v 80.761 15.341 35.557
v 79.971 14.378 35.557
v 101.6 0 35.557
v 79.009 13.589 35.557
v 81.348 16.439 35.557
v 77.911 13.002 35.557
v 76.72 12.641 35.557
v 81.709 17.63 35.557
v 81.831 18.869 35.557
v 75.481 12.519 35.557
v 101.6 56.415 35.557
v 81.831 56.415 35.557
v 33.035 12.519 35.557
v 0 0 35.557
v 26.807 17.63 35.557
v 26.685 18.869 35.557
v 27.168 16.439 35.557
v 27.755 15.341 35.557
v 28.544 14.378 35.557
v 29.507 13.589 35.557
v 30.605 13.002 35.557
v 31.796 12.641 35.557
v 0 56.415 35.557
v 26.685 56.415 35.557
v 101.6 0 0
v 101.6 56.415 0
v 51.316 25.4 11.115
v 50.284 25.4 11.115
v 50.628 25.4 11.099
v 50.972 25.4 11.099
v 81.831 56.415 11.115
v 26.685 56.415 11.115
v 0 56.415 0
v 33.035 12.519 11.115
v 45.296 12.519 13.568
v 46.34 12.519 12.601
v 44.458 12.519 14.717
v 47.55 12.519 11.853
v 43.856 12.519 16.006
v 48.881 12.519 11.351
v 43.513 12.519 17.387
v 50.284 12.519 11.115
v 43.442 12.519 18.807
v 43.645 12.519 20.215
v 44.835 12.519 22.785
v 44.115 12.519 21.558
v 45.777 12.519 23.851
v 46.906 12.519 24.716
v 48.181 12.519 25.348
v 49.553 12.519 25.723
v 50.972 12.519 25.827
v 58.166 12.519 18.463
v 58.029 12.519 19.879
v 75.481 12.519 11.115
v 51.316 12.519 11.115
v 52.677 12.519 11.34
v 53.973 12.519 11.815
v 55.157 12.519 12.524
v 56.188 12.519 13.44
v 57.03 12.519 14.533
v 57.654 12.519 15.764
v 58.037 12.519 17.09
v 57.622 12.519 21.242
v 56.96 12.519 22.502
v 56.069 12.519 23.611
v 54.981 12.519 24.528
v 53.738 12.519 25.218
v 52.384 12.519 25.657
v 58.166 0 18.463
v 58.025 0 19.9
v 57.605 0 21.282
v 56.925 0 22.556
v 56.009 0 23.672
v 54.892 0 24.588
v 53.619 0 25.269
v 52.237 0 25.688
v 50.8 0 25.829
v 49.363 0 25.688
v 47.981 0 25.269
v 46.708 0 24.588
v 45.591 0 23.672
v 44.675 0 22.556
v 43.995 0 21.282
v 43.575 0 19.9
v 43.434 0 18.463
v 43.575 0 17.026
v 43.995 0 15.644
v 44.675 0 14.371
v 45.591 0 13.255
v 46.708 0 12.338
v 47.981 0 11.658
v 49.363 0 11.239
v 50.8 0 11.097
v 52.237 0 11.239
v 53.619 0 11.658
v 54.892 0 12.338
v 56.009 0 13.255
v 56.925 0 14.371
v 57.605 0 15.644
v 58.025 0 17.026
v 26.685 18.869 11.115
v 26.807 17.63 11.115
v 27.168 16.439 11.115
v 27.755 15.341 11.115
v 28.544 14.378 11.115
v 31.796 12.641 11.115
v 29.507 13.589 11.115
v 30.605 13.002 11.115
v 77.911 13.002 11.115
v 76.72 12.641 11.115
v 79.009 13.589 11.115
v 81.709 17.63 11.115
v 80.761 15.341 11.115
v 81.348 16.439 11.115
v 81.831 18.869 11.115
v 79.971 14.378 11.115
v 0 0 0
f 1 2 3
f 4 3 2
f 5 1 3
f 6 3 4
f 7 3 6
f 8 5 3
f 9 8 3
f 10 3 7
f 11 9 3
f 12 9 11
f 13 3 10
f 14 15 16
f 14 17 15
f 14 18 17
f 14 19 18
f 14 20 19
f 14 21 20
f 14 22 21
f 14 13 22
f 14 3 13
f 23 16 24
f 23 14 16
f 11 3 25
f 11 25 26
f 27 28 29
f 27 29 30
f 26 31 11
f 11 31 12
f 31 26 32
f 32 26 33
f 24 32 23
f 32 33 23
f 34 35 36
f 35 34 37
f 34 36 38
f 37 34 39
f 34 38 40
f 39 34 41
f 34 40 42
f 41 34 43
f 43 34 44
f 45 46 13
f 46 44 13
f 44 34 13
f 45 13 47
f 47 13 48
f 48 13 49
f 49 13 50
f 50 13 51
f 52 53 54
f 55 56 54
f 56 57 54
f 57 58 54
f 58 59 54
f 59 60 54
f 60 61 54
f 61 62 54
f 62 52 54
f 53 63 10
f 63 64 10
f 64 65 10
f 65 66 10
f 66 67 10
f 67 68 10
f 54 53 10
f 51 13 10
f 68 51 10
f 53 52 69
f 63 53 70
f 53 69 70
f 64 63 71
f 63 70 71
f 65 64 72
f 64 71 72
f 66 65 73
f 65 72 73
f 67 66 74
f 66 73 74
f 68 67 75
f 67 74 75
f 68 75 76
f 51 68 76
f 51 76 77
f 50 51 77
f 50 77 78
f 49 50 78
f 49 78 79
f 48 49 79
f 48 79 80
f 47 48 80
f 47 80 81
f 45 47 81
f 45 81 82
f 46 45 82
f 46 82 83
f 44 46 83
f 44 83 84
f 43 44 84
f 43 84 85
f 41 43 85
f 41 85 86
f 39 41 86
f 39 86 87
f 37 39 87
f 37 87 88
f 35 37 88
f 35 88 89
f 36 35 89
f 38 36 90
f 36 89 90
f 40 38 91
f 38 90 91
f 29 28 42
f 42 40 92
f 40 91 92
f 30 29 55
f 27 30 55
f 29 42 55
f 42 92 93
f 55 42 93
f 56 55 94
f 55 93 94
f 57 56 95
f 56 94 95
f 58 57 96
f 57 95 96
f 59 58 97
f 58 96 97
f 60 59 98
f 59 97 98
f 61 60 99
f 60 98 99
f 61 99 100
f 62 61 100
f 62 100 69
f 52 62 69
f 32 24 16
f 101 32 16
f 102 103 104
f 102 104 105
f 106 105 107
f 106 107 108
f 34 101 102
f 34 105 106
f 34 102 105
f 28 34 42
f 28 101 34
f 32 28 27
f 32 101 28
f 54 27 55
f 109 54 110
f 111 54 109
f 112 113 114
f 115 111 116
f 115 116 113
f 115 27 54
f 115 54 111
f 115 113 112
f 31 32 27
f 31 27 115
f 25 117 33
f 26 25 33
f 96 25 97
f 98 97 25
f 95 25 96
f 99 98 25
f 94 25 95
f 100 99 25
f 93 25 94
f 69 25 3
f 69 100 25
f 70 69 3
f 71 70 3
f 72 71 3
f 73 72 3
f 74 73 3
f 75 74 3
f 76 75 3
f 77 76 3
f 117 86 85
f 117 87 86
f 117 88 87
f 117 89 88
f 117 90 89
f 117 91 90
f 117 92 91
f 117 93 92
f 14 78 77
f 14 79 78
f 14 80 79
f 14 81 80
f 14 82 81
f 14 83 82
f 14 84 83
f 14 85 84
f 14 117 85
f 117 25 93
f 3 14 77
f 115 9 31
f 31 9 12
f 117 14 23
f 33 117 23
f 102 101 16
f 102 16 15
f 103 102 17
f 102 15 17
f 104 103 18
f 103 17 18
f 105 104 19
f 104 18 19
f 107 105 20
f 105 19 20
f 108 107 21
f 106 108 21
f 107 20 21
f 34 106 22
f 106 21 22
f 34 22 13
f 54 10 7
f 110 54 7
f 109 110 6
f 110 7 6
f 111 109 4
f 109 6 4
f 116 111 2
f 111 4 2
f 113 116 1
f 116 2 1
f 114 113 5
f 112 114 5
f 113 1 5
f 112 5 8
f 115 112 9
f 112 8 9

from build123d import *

# Parameters (mm, degrees)
F0_W     = 56.4152672887
F0_H     = 35.5571135879
F1_DEPTH = 101.6
F3_DEPTH = 24.4419761002
F4_R     = 7.3661777125
F5_DEPTH = 25.4


with BuildPart() as f1:
    # F0 (on Right) → F1 (new body)
    with BuildSketch(Plane.YZ):
        with Locations((28.2076336443, 17.7785567939)):
            Rectangle(F0_W, F0_H)
    extrude(amount=F1_DEPTH)

    # F2 (on face) → F3 (cut)
    with BuildSketch(Plane.XY.offset(35.5571135879)):
        with BuildLine():
            Line((81.8312615156, 18.8686089426), (81.8312615156, 56.4152672887))
            Line((81.8312615156, 56.4152672887), (26.6845934093, 56.4152672887))
            Line((26.6845934093, 56.4152672887), (26.6845934093, 18.8686089426))
            ThreePointArc((26.6845934093, 18.8686089426), (28.5444653488, 14.3784808821), (33.0345934093, 12.5186089426))
            Line((33.0345934093, 12.5186089426), (75.4812615156, 12.5186089426))
            ThreePointArc((75.4812615156, 12.5186089426), (79.9713895762, 14.3784808821), (81.8312615156, 18.8686089426))
        make_face()
    extrude(amount=-F3_DEPTH, mode=Mode.SUBTRACT)

    # F4 (on face) → F5 (cut)
    with BuildSketch(Plane.XZ):
        with Locations((50.8, 18.4632241726)):
            Circle(F4_R)
    extrude(amount=-F5_DEPTH, mode=Mode.SUBTRACT)


solid = f1.part
